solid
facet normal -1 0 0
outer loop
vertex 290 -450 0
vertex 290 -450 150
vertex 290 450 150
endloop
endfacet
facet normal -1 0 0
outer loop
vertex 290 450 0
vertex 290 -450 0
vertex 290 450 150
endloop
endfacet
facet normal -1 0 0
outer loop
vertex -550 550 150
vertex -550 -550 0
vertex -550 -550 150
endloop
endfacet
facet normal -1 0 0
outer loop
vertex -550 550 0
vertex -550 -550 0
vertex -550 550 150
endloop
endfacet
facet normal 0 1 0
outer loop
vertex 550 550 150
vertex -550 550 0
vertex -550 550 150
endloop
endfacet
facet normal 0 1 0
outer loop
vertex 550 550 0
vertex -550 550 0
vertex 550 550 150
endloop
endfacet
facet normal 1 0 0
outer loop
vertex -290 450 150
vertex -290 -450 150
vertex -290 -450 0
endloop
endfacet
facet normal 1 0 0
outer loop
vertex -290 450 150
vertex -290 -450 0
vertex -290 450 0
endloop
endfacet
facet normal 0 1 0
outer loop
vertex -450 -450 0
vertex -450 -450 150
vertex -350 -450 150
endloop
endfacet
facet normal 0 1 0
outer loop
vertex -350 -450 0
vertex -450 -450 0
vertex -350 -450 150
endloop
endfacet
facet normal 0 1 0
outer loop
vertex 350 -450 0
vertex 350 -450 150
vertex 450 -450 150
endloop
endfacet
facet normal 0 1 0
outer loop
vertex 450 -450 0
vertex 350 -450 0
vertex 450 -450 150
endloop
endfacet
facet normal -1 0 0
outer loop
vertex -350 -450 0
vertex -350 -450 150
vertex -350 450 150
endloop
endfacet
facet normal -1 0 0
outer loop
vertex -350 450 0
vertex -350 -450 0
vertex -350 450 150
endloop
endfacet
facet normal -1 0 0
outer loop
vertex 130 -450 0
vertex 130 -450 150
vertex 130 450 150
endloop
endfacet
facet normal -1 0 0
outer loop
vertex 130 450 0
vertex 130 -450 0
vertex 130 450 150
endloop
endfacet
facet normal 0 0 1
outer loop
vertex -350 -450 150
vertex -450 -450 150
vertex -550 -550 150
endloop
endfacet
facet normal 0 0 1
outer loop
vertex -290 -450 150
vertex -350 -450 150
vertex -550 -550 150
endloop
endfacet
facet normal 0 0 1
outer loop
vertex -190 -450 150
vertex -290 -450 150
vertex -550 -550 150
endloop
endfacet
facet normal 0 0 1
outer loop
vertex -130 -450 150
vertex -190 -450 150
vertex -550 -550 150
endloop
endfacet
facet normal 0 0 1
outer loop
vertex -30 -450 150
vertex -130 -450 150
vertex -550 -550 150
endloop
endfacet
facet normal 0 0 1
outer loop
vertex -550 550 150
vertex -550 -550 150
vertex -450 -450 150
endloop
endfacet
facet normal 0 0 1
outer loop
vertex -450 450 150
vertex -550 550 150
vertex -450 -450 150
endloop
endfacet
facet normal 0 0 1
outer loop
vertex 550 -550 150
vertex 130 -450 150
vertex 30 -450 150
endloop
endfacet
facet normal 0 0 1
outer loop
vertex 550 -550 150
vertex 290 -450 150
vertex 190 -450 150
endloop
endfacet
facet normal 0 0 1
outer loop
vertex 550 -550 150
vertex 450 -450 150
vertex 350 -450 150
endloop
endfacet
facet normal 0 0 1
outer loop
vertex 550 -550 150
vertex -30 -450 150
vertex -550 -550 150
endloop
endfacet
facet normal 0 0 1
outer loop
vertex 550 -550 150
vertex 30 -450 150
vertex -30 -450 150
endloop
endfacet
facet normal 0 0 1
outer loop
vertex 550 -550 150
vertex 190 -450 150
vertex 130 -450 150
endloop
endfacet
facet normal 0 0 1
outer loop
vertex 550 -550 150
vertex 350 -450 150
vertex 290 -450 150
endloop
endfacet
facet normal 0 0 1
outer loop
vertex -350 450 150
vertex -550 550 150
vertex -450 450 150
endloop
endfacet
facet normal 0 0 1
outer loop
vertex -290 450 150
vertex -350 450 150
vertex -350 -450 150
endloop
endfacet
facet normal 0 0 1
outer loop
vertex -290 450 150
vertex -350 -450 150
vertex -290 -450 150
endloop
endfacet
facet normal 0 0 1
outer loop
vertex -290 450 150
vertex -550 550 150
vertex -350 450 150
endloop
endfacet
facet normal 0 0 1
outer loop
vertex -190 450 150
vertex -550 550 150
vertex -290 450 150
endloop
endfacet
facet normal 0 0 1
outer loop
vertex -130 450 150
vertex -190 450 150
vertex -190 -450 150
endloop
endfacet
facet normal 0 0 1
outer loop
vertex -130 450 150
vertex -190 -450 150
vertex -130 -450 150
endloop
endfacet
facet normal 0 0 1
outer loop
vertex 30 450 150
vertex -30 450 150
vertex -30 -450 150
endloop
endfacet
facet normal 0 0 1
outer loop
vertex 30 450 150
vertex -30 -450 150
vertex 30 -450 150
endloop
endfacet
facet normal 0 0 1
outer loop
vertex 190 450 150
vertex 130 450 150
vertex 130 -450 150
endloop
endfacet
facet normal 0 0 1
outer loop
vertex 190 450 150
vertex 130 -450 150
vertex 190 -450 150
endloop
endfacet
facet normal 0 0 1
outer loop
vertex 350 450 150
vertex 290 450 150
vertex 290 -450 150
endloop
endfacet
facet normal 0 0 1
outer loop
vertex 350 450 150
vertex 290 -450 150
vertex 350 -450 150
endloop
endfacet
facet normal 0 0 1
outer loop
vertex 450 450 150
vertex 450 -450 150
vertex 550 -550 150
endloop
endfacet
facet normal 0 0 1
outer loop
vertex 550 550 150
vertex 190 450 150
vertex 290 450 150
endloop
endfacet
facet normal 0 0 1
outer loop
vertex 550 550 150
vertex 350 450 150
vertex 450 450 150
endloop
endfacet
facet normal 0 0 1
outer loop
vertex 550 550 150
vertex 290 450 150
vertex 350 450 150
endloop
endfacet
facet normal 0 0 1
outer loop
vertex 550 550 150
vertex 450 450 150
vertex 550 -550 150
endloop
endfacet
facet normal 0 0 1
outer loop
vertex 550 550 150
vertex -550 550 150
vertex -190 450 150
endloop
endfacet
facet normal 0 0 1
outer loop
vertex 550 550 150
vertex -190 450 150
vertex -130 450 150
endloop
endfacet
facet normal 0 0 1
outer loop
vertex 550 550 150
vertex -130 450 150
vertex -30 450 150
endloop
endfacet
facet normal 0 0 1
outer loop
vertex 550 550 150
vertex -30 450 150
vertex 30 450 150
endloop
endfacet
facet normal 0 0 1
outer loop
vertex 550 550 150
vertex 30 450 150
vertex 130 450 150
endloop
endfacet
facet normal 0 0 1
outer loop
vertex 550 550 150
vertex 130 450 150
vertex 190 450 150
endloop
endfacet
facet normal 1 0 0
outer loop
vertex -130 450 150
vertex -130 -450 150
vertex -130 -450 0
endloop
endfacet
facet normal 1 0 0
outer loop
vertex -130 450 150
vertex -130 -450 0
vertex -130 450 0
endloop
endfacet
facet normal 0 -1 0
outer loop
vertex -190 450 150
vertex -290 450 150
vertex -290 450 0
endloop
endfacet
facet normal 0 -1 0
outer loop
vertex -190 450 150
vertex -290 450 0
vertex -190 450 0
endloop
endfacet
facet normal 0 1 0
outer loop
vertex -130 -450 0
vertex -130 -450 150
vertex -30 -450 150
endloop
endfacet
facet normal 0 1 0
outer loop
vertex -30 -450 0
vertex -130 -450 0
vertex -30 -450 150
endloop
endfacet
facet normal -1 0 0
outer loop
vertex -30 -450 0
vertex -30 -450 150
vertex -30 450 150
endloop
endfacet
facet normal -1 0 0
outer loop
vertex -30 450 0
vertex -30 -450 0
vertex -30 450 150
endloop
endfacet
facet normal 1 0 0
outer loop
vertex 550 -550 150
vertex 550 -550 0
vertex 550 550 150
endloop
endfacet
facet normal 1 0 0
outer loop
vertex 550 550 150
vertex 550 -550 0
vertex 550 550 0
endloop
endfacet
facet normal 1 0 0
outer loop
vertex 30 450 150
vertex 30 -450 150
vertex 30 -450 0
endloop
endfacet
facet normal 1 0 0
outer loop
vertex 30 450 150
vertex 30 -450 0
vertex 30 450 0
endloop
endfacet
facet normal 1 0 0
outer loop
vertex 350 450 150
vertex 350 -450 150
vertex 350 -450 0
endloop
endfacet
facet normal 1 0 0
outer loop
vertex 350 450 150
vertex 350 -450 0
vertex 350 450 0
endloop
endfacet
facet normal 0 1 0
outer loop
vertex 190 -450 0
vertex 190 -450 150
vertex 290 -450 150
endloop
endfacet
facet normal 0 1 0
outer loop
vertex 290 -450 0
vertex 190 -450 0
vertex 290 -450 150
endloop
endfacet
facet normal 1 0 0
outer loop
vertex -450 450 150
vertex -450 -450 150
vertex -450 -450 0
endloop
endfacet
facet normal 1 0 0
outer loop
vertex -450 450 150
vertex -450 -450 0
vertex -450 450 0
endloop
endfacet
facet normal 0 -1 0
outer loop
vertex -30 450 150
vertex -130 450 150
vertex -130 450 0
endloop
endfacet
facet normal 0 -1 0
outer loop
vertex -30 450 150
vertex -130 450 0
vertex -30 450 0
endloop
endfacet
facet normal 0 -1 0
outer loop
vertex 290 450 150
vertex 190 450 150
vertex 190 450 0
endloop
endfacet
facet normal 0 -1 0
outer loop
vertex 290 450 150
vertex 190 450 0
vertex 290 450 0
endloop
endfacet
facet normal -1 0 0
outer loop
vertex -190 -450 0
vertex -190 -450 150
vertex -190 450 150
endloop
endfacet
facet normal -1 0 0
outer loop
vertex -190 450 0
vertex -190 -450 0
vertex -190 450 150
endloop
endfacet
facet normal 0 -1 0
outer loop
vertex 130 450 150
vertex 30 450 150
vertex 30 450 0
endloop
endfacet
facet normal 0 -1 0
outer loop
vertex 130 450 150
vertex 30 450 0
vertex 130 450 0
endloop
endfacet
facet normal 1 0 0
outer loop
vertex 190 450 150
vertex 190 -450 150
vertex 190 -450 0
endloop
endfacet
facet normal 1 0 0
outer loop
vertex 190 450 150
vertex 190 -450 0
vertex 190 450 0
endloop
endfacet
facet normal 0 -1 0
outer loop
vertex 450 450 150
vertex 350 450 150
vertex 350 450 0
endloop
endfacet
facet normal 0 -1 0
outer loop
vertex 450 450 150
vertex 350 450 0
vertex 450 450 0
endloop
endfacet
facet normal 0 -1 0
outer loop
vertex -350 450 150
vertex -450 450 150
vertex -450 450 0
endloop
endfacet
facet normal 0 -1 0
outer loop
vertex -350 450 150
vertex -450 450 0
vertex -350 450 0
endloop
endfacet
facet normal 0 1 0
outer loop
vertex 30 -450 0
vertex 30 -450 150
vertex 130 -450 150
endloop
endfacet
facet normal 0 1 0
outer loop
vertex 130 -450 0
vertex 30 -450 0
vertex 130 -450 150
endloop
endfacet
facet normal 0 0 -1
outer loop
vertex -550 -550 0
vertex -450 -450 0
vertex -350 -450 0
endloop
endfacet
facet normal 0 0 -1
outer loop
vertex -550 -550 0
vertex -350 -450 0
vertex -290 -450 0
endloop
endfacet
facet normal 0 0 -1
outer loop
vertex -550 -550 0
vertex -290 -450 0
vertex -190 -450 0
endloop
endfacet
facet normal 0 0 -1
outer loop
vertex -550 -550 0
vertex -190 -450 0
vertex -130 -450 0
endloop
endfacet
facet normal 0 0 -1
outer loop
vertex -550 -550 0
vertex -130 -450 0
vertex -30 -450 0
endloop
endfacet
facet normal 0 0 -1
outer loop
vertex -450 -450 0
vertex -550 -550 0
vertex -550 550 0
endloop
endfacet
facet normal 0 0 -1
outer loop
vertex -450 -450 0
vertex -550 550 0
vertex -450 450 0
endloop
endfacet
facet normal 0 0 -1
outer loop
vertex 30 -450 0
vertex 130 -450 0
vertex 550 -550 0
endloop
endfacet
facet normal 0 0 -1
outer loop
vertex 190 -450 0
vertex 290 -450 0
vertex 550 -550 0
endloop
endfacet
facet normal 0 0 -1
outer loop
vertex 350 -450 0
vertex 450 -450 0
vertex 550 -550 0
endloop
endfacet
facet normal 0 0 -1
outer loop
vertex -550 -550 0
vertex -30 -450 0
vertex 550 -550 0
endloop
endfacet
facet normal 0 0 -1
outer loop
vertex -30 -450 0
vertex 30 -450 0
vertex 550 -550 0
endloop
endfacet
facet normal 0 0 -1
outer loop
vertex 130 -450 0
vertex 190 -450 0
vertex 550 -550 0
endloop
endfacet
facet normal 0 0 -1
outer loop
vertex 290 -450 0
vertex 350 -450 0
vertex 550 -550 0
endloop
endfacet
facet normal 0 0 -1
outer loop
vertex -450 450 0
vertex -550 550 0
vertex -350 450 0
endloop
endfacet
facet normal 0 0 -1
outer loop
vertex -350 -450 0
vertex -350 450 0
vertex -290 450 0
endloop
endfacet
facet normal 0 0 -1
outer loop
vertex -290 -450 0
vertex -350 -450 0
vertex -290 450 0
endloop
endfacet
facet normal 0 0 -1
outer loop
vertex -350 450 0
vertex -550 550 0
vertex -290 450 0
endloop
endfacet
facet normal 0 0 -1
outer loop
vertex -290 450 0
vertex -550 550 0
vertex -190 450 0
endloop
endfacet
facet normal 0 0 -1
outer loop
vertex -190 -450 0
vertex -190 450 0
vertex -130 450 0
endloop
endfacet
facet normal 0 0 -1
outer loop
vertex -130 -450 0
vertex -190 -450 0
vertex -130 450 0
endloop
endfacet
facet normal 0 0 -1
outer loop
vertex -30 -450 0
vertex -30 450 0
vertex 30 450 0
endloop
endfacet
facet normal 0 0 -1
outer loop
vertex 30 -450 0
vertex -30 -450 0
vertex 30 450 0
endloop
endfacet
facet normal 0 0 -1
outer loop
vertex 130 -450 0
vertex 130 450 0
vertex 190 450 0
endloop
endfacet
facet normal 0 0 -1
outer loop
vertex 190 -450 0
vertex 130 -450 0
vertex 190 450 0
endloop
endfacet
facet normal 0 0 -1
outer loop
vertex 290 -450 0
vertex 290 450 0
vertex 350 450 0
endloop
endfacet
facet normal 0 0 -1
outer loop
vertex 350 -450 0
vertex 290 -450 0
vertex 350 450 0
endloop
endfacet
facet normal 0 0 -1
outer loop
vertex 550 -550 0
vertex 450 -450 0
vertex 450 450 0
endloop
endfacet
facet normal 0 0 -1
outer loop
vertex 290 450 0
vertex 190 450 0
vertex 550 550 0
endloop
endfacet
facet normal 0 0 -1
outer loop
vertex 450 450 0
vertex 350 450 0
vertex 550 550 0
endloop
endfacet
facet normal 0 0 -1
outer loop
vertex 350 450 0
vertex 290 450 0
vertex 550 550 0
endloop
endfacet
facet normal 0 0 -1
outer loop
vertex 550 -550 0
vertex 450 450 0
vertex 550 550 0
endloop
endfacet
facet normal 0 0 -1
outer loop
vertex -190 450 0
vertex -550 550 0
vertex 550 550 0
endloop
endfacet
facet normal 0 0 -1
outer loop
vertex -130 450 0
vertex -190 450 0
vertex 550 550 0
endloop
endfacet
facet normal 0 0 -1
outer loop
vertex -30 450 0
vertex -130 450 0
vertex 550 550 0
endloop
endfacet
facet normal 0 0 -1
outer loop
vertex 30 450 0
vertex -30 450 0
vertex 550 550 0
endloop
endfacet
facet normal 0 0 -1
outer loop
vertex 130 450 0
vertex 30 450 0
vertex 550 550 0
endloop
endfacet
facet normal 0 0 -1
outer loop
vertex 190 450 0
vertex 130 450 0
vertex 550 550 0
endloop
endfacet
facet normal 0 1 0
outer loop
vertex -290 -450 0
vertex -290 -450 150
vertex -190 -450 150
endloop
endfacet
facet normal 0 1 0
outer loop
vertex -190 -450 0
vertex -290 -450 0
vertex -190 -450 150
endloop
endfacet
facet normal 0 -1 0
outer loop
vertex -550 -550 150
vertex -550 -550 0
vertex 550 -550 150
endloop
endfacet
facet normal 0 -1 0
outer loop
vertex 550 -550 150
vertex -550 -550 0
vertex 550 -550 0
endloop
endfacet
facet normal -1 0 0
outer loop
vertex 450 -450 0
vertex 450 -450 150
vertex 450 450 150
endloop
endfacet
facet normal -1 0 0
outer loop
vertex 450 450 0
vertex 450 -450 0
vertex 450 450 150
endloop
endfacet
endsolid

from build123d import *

# Parameters (mm, degrees)
F0_W     = 1100
F0_H     = 1100
F1_DEPTH = 150
F2_W     = 100
F2_H     = 900
F3_DEPTH = 150


with BuildPart() as f1:
    # F0 (on Top) → F1 (new body)
    with BuildSketch(Plane.XY):
        Rectangle(F0_W, F0_H)
    extrude(amount=F1_DEPTH)

    # F2 (on face) → F3 (cut)
    with BuildSketch(Plane.XY.offset(150)):
        with Locations((-400, 0)):
            Rectangle(F2_W, F2_H)
        with Locations((-240, 0)):
            Rectangle(F2_W, F2_H)
        with Locations((-80, 0)):
            Rectangle(F2_W, F2_H)
        with Locations((80, 0)):
            Rectangle(F2_W, F2_H)
        with Locations((240, 0)):
            Rectangle(F2_W, F2_H)
        with Locations((400, 0)):
            Rectangle(F2_W, F2_H)
    extrude(amount=-F3_DEPTH, mode=Mode.SUBTRACT)


solid = f1.part
